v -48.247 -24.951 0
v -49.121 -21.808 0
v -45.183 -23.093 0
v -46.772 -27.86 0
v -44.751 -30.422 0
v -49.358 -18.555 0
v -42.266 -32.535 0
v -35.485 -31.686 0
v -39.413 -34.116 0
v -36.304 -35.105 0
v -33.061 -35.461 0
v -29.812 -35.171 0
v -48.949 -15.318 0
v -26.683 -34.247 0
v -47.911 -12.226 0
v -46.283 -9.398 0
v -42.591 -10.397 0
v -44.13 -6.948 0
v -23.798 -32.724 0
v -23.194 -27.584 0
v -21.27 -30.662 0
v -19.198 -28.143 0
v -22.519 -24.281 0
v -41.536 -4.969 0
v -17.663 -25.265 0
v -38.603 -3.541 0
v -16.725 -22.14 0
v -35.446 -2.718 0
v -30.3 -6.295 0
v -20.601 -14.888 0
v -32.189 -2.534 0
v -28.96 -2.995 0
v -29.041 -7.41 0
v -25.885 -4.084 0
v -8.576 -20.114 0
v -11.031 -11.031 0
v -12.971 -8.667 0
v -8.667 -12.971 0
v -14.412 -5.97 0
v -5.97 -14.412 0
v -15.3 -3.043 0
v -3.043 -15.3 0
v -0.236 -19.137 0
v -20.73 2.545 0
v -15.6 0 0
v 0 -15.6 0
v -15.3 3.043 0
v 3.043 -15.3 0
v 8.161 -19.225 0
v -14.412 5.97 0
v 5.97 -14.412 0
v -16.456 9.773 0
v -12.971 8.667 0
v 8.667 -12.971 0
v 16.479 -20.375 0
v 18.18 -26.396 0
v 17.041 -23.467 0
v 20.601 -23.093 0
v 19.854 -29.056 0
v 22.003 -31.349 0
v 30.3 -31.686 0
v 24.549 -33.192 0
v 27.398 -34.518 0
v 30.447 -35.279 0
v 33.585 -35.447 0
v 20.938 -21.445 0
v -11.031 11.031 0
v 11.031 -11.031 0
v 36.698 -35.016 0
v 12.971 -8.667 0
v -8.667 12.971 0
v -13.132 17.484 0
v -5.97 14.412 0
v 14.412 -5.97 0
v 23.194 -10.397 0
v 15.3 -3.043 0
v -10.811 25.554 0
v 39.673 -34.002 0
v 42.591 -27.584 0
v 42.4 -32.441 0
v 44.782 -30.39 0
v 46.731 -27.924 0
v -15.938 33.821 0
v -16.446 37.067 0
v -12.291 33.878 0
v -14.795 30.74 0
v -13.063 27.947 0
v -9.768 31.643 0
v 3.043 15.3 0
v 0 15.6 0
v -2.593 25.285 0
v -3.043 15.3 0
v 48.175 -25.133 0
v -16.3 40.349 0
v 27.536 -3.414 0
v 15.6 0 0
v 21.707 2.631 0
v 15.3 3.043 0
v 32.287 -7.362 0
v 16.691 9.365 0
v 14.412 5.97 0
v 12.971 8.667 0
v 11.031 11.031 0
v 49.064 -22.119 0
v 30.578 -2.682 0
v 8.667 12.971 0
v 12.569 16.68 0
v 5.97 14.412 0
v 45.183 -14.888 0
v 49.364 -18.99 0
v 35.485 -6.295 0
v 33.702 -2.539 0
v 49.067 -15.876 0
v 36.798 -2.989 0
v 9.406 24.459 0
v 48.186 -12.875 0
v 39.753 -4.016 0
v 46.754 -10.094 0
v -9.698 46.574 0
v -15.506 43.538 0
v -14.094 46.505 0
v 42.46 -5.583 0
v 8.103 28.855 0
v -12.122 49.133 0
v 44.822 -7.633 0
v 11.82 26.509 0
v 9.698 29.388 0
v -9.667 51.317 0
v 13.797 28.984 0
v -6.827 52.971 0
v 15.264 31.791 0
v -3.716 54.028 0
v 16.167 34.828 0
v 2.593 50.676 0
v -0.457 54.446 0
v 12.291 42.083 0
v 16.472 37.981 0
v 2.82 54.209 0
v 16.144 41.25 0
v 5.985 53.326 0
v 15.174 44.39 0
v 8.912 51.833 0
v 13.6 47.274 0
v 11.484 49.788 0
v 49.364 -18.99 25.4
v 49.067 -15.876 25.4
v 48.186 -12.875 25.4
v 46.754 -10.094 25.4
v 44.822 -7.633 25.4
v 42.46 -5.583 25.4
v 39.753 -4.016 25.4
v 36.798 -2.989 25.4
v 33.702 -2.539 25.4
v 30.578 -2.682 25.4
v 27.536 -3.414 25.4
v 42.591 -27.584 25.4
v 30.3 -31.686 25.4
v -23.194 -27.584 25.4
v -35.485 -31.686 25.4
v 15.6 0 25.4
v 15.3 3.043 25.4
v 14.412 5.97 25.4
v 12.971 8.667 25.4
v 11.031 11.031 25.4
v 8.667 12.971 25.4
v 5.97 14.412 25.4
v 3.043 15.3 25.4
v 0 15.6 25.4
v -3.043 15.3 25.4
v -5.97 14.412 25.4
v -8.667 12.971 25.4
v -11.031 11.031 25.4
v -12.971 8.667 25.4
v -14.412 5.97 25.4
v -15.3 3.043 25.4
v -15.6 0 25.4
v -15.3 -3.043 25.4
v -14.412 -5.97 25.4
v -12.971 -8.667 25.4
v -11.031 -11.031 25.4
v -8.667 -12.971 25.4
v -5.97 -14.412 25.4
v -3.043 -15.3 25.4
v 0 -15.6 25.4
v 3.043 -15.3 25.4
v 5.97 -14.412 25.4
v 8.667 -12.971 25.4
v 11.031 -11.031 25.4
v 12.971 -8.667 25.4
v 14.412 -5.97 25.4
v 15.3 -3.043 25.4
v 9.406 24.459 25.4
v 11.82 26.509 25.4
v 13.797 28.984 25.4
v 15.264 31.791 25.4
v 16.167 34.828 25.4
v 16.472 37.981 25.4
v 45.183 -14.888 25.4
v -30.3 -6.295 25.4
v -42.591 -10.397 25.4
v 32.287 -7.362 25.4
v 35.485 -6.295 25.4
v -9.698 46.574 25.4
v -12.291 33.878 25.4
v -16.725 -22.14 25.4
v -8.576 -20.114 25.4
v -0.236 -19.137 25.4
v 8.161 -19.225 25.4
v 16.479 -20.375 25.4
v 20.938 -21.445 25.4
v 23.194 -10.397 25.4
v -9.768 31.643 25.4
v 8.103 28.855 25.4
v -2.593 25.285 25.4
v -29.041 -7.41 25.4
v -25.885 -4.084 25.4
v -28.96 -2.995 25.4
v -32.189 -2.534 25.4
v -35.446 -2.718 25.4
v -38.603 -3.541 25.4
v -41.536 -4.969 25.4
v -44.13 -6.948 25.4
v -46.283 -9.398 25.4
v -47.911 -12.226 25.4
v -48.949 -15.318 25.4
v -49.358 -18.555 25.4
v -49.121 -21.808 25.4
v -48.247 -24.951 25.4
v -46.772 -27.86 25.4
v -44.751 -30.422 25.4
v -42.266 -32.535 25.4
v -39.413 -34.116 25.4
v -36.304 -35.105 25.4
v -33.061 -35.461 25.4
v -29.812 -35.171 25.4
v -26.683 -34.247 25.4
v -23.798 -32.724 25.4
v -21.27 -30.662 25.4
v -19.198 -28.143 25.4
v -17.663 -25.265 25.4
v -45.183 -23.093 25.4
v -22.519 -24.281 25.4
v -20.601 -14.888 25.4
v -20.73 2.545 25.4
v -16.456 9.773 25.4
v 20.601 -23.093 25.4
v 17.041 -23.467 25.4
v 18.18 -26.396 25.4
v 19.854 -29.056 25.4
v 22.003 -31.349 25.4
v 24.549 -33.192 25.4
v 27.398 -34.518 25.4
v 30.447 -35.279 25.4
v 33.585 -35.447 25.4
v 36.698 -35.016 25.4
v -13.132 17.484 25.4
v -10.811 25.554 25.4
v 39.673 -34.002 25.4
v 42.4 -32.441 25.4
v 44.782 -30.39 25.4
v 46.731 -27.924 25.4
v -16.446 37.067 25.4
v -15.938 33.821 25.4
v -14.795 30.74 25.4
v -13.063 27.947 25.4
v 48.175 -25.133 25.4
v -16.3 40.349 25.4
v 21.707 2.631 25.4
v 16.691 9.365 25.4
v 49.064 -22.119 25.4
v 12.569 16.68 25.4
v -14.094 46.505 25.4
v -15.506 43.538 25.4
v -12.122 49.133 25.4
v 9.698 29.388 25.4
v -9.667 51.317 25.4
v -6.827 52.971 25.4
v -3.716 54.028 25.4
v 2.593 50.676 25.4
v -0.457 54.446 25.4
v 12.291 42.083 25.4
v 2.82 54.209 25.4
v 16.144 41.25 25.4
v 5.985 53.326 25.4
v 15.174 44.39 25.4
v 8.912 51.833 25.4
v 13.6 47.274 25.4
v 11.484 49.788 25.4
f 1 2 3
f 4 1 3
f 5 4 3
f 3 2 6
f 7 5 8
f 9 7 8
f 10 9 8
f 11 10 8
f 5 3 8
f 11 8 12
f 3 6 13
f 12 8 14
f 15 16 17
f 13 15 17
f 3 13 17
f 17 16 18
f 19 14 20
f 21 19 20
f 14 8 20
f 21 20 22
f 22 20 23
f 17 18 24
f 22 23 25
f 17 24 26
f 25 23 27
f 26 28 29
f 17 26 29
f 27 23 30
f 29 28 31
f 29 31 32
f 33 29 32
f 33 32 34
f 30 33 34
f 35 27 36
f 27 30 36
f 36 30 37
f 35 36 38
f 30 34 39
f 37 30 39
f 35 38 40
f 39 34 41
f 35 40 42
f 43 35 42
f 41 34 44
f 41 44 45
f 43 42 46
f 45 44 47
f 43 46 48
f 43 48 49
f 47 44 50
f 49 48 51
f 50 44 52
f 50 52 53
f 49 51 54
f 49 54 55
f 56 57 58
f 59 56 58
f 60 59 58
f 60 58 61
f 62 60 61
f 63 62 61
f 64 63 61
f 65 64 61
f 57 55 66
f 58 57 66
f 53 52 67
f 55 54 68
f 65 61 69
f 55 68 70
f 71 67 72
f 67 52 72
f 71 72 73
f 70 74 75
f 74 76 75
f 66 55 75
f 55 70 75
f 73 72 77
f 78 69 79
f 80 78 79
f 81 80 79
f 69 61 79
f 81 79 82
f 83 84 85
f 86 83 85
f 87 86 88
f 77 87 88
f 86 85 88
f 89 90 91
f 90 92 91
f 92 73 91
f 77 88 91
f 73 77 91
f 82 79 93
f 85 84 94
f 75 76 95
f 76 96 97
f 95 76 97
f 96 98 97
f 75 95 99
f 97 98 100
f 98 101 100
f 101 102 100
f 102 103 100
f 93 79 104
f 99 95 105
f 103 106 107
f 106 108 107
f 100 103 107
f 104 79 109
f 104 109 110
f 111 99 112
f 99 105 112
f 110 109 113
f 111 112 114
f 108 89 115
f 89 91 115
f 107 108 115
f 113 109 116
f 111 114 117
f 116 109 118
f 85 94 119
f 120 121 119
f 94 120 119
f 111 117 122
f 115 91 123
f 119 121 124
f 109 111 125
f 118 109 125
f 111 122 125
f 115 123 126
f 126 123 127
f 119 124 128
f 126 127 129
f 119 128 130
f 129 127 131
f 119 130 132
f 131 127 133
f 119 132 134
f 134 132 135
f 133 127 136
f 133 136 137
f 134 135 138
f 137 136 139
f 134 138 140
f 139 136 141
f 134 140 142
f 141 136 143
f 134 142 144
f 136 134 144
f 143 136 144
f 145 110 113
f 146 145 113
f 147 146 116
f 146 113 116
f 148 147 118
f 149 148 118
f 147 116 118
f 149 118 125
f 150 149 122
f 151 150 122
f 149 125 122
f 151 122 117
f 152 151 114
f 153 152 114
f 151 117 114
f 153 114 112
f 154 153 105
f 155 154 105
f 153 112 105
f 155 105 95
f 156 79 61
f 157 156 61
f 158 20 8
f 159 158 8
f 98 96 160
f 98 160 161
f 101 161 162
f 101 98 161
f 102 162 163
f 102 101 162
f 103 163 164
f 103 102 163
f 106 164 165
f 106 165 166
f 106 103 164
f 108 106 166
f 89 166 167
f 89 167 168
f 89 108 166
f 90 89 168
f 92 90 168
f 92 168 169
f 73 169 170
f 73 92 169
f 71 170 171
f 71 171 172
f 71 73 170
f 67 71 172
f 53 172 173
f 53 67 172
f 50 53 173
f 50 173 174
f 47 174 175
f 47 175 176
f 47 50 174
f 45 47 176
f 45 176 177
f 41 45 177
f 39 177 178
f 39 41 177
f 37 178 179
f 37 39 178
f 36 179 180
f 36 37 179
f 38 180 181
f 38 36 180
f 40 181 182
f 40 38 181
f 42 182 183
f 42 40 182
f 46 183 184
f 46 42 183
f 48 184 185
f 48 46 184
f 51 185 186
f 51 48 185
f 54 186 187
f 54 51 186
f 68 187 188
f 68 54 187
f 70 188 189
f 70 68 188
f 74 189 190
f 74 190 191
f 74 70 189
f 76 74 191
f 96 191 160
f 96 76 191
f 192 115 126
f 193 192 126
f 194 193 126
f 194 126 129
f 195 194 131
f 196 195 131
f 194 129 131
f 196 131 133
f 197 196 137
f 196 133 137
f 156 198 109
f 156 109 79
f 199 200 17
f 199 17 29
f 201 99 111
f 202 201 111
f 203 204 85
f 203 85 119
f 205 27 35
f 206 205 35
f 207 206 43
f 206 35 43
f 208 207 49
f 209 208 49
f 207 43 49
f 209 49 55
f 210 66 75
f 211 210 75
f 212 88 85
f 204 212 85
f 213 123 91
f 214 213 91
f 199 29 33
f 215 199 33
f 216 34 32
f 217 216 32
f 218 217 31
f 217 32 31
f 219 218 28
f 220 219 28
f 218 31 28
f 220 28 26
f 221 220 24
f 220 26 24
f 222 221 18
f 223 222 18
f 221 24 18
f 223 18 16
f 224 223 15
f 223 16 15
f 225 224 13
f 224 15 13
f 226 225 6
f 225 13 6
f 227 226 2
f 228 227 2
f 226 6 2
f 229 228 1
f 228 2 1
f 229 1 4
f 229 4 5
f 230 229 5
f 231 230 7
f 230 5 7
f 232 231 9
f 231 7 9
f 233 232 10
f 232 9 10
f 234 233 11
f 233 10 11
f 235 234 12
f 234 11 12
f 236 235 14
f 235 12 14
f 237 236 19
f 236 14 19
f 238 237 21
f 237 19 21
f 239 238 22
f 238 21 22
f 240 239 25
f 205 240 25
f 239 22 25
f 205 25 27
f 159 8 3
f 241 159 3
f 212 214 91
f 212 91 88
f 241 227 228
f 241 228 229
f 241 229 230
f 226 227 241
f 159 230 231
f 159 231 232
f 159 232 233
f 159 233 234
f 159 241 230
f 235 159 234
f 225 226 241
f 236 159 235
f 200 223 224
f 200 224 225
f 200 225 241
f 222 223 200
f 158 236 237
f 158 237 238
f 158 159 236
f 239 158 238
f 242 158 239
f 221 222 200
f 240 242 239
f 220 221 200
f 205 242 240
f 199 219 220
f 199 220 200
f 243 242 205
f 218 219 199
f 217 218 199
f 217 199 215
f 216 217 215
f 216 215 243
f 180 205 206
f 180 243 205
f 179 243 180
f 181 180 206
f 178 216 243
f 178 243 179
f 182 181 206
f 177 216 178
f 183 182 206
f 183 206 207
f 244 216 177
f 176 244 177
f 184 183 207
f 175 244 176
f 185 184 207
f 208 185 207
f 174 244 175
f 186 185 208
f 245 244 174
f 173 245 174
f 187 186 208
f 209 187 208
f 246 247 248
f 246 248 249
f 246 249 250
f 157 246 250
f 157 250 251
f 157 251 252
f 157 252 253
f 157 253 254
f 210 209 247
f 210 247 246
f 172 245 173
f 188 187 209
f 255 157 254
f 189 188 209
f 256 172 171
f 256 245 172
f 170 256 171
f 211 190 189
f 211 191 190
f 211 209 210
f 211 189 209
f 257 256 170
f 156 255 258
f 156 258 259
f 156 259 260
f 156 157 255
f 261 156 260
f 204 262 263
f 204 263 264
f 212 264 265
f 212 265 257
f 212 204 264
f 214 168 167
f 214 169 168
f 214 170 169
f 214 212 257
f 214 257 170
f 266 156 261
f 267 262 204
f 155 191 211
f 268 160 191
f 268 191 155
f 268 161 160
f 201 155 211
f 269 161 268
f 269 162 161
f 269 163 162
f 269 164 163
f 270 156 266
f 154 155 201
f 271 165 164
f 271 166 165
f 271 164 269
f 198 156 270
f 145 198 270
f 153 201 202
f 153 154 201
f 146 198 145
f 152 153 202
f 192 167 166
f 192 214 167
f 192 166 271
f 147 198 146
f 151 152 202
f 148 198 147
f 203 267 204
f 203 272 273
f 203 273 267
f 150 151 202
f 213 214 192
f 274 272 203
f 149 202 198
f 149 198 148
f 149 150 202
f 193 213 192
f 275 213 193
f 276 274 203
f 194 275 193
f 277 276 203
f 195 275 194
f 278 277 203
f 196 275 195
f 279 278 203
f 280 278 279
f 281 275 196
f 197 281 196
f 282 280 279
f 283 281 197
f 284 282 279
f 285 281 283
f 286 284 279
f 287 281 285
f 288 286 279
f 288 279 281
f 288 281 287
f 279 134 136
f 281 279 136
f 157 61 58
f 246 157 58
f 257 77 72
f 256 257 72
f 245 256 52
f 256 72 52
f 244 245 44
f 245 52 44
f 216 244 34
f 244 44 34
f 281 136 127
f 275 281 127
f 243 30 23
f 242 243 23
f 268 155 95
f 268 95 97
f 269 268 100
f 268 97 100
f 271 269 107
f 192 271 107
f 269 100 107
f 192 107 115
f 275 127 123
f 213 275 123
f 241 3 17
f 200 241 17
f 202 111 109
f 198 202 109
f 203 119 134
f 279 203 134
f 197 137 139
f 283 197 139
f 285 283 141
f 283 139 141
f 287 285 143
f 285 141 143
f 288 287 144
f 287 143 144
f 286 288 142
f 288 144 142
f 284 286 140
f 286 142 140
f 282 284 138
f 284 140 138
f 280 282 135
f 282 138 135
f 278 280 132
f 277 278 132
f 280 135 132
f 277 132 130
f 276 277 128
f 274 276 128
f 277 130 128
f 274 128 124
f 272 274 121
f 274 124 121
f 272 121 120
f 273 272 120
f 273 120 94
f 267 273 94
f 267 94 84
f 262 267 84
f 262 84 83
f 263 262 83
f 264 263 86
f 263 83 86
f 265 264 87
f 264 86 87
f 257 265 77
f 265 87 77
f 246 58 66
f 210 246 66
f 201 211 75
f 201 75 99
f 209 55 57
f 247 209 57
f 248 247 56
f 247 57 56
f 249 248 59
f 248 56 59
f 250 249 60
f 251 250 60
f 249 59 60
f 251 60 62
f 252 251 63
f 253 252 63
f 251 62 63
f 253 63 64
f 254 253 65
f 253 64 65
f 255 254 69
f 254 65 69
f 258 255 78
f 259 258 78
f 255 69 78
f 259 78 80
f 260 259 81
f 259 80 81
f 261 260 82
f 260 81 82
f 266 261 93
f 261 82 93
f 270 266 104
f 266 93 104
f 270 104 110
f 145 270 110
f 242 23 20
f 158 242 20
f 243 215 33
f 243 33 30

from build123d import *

# Parameters (mm, degrees)
F0_R     = 15.5998218224
F1_DEPTH = 25.4


# Not quite as in the source:
# - a feature of the source that left no trace in its solid (it failed there, or was rolled back) is left out


with BuildPart() as f1:
    # F0 (on Top) → F1 (new body)
    with BuildSketch(Plane.XY):
        with BuildLine():
            Line((-9.7679234278, 31.6427110991), (-12.2910759721, 33.8783473239))
            Line((-12.2910759721, 33.8783473239), (-9.6983198699, 46.5739309325))
            Line((-9.6983198699, 46.5739309325), (2.5927561023, 50.6763300865))
            Line((2.5927561023, 50.6763300865), (12.2910759721, 42.0831456318))
            Line((12.2910759721, 42.0831456318), (9.6983198699, 29.3875620231))
            Line((9.6983198699, 29.3875620231), (8.1033290175, 28.8552010534))
            ThreePointArc((8.1033290175, 28.8552010534), (8.7164308394, 26.6457057993), (9.4057371171, 24.4587855955))
            ThreePointArc((9.4057371171, 24.4587855955), (14.5985992918, 30.3523642419), (16.4715304941, 37.9807464778))
            ThreePointArc((16.4715304941, 37.9807464778), (-6.8274979981, 52.9706293294), (-10.8114943571, 25.5540451221))
            ThreePointArc((-10.8114943571, 25.5540451221), (-10.2185999519, 28.5861903467), (-9.7679234278, 31.6427110991))
        make_face()
        with BuildLine():
            Line((-2.5927561023, 25.2851628692), (-9.7679234278, 31.6427110991))
            ThreePointArc((-9.7679234278, 31.6427110991), (-10.2185999519, 28.5861903467), (-10.8114943571, 25.5540451221))
            ThreePointArc((-10.8114943571, 25.5540451221), (-0.8910312632, 21.5333339121), (9.4057371171, 24.4587855955))
            ThreePointArc((9.4057371171, 24.4587855955), (8.7164308394, 26.6457057993), (8.1033290175, 28.8552010534))
            Line((8.1033290175, 28.8552010534), (-2.5927561023, 25.2851628692))
        make_face()
        with BuildLine():
            ThreePointArc((9.4057371171, 24.4587855955), (-0.8910312632, 21.5333339121), (-10.8114943571, 25.5540451221))
            ThreePointArc((-10.8114943571, 25.5540451221), (-16.4556801257, 9.772653233), (-25.88479823, -4.083785513))
            ThreePointArc((-25.88479823, -4.083785513), (-27.4340735437, -5.7742023624), (-29.0410016523, -7.4099117424))
            Line((-29.0410016523, -7.4099117424), (-20.6012153324, -14.887974085))
            Line((-20.6012153324, -14.887974085), (-22.5194299425, -24.2806253802))
            ThreePointArc((-22.5194299425, -24.2806253802), (-19.6470670617, -23.1426623228), (-16.7247050666, -22.1400513271))
            ThreePointArc((-16.7247050666, -22.1400513271), (-0.2355258993, -19.1373636419), (16.4790611129, -20.3750000825))
            ThreePointArc((16.4790611129, -20.3750000825), (19.0939298277, -9.9950112466), (27.5361994237, -3.4139937949))
            ThreePointArc((27.5361994237, -3.4139937949), (16.691206025, 9.3647104089), (9.4057371171, 24.4587855955))
        make_face()
        Circle(F0_R, mode=Mode.SUBTRACT)
        with BuildLine():
            ThreePointArc((-29.0410016523, -7.4099117424), (-27.4340735437, -5.7742023624), (-25.88479823, -4.083785513))
            ThreePointArc((-25.88479823, -4.083785513), (-47.5816840445, -26.4424238123), (-16.7247050666, -22.1400513271))
            ThreePointArc((-16.7247050666, -22.1400513271), (-19.6470670617, -23.1426623228), (-22.5194299425, -24.2806253802))
            Line((-22.5194299425, -24.2806253802), (-23.1939714347, -27.5835576936))
            Line((-23.1939714347, -27.5835576936), (-35.4850474068, -31.6859568476))
            Line((-35.4850474068, -31.6859568476), (-45.1833672766, -23.0927723929))
            Line((-45.1833672766, -23.0927723929), (-42.5906111744, -10.3971887842))
            Line((-42.5906111744, -10.3971887842), (-30.2995352023, -6.2947896303))
            Line((-30.2995352023, -6.2947896303), (-29.0410016523, -7.4099117424))
        make_face()
        with BuildLine():
            ThreePointArc((49.3638217986, -18.9903732389), (42.4601616546, -5.5826451025), (27.5361994237, -3.4139937949))
            ThreePointArc((27.5361994237, -3.4139937949), (29.8656670136, -5.4435280239), (32.2873533703, -7.3620857189))
            Line((32.2873533703, -7.3620857189), (35.4850474068, -6.2947896303))
            Line((35.4850474068, -6.2947896303), (45.1833672766, -14.887974085))
            Line((45.1833672766, -14.887974085), (42.5906111744, -27.5835576936))
            Line((42.5906111744, -27.5835576936), (30.2995352023, -31.6859568476))
            Line((30.2995352023, -31.6859568476), (20.6012153324, -23.0927723929))
            Line((20.6012153324, -23.0927723929), (20.9376726348, -21.4452893111))
            ThreePointArc((20.9376726348, -21.4452893111), (18.7176427043, -20.8715034369), (16.4790611129, -20.3750000825))
            ThreePointArc((16.4790611129, -20.3750000825), (33.5852181443, -35.4473222032), (49.3638217986, -18.9903732389))
        make_face()
        with BuildLine():
            ThreePointArc((32.2873533703, -7.3620857189), (29.8656670136, -5.4435280239), (27.5361994237, -3.4139937949))
            ThreePointArc((27.5361994237, -3.4139937949), (19.0939298277, -9.9950112466), (16.4790611129, -20.3750000825))
            ThreePointArc((16.4790611129, -20.3750000825), (18.7176427043, -20.8715034369), (20.9376726348, -21.4452893111))
            Line((20.9376726348, -21.4452893111), (23.1939714347, -10.3971887842))
            Line((23.1939714347, -10.3971887842), (32.2873533703, -7.3620857189))
        make_face()
    extrude(amount=F1_DEPTH)


solid = f1.part
